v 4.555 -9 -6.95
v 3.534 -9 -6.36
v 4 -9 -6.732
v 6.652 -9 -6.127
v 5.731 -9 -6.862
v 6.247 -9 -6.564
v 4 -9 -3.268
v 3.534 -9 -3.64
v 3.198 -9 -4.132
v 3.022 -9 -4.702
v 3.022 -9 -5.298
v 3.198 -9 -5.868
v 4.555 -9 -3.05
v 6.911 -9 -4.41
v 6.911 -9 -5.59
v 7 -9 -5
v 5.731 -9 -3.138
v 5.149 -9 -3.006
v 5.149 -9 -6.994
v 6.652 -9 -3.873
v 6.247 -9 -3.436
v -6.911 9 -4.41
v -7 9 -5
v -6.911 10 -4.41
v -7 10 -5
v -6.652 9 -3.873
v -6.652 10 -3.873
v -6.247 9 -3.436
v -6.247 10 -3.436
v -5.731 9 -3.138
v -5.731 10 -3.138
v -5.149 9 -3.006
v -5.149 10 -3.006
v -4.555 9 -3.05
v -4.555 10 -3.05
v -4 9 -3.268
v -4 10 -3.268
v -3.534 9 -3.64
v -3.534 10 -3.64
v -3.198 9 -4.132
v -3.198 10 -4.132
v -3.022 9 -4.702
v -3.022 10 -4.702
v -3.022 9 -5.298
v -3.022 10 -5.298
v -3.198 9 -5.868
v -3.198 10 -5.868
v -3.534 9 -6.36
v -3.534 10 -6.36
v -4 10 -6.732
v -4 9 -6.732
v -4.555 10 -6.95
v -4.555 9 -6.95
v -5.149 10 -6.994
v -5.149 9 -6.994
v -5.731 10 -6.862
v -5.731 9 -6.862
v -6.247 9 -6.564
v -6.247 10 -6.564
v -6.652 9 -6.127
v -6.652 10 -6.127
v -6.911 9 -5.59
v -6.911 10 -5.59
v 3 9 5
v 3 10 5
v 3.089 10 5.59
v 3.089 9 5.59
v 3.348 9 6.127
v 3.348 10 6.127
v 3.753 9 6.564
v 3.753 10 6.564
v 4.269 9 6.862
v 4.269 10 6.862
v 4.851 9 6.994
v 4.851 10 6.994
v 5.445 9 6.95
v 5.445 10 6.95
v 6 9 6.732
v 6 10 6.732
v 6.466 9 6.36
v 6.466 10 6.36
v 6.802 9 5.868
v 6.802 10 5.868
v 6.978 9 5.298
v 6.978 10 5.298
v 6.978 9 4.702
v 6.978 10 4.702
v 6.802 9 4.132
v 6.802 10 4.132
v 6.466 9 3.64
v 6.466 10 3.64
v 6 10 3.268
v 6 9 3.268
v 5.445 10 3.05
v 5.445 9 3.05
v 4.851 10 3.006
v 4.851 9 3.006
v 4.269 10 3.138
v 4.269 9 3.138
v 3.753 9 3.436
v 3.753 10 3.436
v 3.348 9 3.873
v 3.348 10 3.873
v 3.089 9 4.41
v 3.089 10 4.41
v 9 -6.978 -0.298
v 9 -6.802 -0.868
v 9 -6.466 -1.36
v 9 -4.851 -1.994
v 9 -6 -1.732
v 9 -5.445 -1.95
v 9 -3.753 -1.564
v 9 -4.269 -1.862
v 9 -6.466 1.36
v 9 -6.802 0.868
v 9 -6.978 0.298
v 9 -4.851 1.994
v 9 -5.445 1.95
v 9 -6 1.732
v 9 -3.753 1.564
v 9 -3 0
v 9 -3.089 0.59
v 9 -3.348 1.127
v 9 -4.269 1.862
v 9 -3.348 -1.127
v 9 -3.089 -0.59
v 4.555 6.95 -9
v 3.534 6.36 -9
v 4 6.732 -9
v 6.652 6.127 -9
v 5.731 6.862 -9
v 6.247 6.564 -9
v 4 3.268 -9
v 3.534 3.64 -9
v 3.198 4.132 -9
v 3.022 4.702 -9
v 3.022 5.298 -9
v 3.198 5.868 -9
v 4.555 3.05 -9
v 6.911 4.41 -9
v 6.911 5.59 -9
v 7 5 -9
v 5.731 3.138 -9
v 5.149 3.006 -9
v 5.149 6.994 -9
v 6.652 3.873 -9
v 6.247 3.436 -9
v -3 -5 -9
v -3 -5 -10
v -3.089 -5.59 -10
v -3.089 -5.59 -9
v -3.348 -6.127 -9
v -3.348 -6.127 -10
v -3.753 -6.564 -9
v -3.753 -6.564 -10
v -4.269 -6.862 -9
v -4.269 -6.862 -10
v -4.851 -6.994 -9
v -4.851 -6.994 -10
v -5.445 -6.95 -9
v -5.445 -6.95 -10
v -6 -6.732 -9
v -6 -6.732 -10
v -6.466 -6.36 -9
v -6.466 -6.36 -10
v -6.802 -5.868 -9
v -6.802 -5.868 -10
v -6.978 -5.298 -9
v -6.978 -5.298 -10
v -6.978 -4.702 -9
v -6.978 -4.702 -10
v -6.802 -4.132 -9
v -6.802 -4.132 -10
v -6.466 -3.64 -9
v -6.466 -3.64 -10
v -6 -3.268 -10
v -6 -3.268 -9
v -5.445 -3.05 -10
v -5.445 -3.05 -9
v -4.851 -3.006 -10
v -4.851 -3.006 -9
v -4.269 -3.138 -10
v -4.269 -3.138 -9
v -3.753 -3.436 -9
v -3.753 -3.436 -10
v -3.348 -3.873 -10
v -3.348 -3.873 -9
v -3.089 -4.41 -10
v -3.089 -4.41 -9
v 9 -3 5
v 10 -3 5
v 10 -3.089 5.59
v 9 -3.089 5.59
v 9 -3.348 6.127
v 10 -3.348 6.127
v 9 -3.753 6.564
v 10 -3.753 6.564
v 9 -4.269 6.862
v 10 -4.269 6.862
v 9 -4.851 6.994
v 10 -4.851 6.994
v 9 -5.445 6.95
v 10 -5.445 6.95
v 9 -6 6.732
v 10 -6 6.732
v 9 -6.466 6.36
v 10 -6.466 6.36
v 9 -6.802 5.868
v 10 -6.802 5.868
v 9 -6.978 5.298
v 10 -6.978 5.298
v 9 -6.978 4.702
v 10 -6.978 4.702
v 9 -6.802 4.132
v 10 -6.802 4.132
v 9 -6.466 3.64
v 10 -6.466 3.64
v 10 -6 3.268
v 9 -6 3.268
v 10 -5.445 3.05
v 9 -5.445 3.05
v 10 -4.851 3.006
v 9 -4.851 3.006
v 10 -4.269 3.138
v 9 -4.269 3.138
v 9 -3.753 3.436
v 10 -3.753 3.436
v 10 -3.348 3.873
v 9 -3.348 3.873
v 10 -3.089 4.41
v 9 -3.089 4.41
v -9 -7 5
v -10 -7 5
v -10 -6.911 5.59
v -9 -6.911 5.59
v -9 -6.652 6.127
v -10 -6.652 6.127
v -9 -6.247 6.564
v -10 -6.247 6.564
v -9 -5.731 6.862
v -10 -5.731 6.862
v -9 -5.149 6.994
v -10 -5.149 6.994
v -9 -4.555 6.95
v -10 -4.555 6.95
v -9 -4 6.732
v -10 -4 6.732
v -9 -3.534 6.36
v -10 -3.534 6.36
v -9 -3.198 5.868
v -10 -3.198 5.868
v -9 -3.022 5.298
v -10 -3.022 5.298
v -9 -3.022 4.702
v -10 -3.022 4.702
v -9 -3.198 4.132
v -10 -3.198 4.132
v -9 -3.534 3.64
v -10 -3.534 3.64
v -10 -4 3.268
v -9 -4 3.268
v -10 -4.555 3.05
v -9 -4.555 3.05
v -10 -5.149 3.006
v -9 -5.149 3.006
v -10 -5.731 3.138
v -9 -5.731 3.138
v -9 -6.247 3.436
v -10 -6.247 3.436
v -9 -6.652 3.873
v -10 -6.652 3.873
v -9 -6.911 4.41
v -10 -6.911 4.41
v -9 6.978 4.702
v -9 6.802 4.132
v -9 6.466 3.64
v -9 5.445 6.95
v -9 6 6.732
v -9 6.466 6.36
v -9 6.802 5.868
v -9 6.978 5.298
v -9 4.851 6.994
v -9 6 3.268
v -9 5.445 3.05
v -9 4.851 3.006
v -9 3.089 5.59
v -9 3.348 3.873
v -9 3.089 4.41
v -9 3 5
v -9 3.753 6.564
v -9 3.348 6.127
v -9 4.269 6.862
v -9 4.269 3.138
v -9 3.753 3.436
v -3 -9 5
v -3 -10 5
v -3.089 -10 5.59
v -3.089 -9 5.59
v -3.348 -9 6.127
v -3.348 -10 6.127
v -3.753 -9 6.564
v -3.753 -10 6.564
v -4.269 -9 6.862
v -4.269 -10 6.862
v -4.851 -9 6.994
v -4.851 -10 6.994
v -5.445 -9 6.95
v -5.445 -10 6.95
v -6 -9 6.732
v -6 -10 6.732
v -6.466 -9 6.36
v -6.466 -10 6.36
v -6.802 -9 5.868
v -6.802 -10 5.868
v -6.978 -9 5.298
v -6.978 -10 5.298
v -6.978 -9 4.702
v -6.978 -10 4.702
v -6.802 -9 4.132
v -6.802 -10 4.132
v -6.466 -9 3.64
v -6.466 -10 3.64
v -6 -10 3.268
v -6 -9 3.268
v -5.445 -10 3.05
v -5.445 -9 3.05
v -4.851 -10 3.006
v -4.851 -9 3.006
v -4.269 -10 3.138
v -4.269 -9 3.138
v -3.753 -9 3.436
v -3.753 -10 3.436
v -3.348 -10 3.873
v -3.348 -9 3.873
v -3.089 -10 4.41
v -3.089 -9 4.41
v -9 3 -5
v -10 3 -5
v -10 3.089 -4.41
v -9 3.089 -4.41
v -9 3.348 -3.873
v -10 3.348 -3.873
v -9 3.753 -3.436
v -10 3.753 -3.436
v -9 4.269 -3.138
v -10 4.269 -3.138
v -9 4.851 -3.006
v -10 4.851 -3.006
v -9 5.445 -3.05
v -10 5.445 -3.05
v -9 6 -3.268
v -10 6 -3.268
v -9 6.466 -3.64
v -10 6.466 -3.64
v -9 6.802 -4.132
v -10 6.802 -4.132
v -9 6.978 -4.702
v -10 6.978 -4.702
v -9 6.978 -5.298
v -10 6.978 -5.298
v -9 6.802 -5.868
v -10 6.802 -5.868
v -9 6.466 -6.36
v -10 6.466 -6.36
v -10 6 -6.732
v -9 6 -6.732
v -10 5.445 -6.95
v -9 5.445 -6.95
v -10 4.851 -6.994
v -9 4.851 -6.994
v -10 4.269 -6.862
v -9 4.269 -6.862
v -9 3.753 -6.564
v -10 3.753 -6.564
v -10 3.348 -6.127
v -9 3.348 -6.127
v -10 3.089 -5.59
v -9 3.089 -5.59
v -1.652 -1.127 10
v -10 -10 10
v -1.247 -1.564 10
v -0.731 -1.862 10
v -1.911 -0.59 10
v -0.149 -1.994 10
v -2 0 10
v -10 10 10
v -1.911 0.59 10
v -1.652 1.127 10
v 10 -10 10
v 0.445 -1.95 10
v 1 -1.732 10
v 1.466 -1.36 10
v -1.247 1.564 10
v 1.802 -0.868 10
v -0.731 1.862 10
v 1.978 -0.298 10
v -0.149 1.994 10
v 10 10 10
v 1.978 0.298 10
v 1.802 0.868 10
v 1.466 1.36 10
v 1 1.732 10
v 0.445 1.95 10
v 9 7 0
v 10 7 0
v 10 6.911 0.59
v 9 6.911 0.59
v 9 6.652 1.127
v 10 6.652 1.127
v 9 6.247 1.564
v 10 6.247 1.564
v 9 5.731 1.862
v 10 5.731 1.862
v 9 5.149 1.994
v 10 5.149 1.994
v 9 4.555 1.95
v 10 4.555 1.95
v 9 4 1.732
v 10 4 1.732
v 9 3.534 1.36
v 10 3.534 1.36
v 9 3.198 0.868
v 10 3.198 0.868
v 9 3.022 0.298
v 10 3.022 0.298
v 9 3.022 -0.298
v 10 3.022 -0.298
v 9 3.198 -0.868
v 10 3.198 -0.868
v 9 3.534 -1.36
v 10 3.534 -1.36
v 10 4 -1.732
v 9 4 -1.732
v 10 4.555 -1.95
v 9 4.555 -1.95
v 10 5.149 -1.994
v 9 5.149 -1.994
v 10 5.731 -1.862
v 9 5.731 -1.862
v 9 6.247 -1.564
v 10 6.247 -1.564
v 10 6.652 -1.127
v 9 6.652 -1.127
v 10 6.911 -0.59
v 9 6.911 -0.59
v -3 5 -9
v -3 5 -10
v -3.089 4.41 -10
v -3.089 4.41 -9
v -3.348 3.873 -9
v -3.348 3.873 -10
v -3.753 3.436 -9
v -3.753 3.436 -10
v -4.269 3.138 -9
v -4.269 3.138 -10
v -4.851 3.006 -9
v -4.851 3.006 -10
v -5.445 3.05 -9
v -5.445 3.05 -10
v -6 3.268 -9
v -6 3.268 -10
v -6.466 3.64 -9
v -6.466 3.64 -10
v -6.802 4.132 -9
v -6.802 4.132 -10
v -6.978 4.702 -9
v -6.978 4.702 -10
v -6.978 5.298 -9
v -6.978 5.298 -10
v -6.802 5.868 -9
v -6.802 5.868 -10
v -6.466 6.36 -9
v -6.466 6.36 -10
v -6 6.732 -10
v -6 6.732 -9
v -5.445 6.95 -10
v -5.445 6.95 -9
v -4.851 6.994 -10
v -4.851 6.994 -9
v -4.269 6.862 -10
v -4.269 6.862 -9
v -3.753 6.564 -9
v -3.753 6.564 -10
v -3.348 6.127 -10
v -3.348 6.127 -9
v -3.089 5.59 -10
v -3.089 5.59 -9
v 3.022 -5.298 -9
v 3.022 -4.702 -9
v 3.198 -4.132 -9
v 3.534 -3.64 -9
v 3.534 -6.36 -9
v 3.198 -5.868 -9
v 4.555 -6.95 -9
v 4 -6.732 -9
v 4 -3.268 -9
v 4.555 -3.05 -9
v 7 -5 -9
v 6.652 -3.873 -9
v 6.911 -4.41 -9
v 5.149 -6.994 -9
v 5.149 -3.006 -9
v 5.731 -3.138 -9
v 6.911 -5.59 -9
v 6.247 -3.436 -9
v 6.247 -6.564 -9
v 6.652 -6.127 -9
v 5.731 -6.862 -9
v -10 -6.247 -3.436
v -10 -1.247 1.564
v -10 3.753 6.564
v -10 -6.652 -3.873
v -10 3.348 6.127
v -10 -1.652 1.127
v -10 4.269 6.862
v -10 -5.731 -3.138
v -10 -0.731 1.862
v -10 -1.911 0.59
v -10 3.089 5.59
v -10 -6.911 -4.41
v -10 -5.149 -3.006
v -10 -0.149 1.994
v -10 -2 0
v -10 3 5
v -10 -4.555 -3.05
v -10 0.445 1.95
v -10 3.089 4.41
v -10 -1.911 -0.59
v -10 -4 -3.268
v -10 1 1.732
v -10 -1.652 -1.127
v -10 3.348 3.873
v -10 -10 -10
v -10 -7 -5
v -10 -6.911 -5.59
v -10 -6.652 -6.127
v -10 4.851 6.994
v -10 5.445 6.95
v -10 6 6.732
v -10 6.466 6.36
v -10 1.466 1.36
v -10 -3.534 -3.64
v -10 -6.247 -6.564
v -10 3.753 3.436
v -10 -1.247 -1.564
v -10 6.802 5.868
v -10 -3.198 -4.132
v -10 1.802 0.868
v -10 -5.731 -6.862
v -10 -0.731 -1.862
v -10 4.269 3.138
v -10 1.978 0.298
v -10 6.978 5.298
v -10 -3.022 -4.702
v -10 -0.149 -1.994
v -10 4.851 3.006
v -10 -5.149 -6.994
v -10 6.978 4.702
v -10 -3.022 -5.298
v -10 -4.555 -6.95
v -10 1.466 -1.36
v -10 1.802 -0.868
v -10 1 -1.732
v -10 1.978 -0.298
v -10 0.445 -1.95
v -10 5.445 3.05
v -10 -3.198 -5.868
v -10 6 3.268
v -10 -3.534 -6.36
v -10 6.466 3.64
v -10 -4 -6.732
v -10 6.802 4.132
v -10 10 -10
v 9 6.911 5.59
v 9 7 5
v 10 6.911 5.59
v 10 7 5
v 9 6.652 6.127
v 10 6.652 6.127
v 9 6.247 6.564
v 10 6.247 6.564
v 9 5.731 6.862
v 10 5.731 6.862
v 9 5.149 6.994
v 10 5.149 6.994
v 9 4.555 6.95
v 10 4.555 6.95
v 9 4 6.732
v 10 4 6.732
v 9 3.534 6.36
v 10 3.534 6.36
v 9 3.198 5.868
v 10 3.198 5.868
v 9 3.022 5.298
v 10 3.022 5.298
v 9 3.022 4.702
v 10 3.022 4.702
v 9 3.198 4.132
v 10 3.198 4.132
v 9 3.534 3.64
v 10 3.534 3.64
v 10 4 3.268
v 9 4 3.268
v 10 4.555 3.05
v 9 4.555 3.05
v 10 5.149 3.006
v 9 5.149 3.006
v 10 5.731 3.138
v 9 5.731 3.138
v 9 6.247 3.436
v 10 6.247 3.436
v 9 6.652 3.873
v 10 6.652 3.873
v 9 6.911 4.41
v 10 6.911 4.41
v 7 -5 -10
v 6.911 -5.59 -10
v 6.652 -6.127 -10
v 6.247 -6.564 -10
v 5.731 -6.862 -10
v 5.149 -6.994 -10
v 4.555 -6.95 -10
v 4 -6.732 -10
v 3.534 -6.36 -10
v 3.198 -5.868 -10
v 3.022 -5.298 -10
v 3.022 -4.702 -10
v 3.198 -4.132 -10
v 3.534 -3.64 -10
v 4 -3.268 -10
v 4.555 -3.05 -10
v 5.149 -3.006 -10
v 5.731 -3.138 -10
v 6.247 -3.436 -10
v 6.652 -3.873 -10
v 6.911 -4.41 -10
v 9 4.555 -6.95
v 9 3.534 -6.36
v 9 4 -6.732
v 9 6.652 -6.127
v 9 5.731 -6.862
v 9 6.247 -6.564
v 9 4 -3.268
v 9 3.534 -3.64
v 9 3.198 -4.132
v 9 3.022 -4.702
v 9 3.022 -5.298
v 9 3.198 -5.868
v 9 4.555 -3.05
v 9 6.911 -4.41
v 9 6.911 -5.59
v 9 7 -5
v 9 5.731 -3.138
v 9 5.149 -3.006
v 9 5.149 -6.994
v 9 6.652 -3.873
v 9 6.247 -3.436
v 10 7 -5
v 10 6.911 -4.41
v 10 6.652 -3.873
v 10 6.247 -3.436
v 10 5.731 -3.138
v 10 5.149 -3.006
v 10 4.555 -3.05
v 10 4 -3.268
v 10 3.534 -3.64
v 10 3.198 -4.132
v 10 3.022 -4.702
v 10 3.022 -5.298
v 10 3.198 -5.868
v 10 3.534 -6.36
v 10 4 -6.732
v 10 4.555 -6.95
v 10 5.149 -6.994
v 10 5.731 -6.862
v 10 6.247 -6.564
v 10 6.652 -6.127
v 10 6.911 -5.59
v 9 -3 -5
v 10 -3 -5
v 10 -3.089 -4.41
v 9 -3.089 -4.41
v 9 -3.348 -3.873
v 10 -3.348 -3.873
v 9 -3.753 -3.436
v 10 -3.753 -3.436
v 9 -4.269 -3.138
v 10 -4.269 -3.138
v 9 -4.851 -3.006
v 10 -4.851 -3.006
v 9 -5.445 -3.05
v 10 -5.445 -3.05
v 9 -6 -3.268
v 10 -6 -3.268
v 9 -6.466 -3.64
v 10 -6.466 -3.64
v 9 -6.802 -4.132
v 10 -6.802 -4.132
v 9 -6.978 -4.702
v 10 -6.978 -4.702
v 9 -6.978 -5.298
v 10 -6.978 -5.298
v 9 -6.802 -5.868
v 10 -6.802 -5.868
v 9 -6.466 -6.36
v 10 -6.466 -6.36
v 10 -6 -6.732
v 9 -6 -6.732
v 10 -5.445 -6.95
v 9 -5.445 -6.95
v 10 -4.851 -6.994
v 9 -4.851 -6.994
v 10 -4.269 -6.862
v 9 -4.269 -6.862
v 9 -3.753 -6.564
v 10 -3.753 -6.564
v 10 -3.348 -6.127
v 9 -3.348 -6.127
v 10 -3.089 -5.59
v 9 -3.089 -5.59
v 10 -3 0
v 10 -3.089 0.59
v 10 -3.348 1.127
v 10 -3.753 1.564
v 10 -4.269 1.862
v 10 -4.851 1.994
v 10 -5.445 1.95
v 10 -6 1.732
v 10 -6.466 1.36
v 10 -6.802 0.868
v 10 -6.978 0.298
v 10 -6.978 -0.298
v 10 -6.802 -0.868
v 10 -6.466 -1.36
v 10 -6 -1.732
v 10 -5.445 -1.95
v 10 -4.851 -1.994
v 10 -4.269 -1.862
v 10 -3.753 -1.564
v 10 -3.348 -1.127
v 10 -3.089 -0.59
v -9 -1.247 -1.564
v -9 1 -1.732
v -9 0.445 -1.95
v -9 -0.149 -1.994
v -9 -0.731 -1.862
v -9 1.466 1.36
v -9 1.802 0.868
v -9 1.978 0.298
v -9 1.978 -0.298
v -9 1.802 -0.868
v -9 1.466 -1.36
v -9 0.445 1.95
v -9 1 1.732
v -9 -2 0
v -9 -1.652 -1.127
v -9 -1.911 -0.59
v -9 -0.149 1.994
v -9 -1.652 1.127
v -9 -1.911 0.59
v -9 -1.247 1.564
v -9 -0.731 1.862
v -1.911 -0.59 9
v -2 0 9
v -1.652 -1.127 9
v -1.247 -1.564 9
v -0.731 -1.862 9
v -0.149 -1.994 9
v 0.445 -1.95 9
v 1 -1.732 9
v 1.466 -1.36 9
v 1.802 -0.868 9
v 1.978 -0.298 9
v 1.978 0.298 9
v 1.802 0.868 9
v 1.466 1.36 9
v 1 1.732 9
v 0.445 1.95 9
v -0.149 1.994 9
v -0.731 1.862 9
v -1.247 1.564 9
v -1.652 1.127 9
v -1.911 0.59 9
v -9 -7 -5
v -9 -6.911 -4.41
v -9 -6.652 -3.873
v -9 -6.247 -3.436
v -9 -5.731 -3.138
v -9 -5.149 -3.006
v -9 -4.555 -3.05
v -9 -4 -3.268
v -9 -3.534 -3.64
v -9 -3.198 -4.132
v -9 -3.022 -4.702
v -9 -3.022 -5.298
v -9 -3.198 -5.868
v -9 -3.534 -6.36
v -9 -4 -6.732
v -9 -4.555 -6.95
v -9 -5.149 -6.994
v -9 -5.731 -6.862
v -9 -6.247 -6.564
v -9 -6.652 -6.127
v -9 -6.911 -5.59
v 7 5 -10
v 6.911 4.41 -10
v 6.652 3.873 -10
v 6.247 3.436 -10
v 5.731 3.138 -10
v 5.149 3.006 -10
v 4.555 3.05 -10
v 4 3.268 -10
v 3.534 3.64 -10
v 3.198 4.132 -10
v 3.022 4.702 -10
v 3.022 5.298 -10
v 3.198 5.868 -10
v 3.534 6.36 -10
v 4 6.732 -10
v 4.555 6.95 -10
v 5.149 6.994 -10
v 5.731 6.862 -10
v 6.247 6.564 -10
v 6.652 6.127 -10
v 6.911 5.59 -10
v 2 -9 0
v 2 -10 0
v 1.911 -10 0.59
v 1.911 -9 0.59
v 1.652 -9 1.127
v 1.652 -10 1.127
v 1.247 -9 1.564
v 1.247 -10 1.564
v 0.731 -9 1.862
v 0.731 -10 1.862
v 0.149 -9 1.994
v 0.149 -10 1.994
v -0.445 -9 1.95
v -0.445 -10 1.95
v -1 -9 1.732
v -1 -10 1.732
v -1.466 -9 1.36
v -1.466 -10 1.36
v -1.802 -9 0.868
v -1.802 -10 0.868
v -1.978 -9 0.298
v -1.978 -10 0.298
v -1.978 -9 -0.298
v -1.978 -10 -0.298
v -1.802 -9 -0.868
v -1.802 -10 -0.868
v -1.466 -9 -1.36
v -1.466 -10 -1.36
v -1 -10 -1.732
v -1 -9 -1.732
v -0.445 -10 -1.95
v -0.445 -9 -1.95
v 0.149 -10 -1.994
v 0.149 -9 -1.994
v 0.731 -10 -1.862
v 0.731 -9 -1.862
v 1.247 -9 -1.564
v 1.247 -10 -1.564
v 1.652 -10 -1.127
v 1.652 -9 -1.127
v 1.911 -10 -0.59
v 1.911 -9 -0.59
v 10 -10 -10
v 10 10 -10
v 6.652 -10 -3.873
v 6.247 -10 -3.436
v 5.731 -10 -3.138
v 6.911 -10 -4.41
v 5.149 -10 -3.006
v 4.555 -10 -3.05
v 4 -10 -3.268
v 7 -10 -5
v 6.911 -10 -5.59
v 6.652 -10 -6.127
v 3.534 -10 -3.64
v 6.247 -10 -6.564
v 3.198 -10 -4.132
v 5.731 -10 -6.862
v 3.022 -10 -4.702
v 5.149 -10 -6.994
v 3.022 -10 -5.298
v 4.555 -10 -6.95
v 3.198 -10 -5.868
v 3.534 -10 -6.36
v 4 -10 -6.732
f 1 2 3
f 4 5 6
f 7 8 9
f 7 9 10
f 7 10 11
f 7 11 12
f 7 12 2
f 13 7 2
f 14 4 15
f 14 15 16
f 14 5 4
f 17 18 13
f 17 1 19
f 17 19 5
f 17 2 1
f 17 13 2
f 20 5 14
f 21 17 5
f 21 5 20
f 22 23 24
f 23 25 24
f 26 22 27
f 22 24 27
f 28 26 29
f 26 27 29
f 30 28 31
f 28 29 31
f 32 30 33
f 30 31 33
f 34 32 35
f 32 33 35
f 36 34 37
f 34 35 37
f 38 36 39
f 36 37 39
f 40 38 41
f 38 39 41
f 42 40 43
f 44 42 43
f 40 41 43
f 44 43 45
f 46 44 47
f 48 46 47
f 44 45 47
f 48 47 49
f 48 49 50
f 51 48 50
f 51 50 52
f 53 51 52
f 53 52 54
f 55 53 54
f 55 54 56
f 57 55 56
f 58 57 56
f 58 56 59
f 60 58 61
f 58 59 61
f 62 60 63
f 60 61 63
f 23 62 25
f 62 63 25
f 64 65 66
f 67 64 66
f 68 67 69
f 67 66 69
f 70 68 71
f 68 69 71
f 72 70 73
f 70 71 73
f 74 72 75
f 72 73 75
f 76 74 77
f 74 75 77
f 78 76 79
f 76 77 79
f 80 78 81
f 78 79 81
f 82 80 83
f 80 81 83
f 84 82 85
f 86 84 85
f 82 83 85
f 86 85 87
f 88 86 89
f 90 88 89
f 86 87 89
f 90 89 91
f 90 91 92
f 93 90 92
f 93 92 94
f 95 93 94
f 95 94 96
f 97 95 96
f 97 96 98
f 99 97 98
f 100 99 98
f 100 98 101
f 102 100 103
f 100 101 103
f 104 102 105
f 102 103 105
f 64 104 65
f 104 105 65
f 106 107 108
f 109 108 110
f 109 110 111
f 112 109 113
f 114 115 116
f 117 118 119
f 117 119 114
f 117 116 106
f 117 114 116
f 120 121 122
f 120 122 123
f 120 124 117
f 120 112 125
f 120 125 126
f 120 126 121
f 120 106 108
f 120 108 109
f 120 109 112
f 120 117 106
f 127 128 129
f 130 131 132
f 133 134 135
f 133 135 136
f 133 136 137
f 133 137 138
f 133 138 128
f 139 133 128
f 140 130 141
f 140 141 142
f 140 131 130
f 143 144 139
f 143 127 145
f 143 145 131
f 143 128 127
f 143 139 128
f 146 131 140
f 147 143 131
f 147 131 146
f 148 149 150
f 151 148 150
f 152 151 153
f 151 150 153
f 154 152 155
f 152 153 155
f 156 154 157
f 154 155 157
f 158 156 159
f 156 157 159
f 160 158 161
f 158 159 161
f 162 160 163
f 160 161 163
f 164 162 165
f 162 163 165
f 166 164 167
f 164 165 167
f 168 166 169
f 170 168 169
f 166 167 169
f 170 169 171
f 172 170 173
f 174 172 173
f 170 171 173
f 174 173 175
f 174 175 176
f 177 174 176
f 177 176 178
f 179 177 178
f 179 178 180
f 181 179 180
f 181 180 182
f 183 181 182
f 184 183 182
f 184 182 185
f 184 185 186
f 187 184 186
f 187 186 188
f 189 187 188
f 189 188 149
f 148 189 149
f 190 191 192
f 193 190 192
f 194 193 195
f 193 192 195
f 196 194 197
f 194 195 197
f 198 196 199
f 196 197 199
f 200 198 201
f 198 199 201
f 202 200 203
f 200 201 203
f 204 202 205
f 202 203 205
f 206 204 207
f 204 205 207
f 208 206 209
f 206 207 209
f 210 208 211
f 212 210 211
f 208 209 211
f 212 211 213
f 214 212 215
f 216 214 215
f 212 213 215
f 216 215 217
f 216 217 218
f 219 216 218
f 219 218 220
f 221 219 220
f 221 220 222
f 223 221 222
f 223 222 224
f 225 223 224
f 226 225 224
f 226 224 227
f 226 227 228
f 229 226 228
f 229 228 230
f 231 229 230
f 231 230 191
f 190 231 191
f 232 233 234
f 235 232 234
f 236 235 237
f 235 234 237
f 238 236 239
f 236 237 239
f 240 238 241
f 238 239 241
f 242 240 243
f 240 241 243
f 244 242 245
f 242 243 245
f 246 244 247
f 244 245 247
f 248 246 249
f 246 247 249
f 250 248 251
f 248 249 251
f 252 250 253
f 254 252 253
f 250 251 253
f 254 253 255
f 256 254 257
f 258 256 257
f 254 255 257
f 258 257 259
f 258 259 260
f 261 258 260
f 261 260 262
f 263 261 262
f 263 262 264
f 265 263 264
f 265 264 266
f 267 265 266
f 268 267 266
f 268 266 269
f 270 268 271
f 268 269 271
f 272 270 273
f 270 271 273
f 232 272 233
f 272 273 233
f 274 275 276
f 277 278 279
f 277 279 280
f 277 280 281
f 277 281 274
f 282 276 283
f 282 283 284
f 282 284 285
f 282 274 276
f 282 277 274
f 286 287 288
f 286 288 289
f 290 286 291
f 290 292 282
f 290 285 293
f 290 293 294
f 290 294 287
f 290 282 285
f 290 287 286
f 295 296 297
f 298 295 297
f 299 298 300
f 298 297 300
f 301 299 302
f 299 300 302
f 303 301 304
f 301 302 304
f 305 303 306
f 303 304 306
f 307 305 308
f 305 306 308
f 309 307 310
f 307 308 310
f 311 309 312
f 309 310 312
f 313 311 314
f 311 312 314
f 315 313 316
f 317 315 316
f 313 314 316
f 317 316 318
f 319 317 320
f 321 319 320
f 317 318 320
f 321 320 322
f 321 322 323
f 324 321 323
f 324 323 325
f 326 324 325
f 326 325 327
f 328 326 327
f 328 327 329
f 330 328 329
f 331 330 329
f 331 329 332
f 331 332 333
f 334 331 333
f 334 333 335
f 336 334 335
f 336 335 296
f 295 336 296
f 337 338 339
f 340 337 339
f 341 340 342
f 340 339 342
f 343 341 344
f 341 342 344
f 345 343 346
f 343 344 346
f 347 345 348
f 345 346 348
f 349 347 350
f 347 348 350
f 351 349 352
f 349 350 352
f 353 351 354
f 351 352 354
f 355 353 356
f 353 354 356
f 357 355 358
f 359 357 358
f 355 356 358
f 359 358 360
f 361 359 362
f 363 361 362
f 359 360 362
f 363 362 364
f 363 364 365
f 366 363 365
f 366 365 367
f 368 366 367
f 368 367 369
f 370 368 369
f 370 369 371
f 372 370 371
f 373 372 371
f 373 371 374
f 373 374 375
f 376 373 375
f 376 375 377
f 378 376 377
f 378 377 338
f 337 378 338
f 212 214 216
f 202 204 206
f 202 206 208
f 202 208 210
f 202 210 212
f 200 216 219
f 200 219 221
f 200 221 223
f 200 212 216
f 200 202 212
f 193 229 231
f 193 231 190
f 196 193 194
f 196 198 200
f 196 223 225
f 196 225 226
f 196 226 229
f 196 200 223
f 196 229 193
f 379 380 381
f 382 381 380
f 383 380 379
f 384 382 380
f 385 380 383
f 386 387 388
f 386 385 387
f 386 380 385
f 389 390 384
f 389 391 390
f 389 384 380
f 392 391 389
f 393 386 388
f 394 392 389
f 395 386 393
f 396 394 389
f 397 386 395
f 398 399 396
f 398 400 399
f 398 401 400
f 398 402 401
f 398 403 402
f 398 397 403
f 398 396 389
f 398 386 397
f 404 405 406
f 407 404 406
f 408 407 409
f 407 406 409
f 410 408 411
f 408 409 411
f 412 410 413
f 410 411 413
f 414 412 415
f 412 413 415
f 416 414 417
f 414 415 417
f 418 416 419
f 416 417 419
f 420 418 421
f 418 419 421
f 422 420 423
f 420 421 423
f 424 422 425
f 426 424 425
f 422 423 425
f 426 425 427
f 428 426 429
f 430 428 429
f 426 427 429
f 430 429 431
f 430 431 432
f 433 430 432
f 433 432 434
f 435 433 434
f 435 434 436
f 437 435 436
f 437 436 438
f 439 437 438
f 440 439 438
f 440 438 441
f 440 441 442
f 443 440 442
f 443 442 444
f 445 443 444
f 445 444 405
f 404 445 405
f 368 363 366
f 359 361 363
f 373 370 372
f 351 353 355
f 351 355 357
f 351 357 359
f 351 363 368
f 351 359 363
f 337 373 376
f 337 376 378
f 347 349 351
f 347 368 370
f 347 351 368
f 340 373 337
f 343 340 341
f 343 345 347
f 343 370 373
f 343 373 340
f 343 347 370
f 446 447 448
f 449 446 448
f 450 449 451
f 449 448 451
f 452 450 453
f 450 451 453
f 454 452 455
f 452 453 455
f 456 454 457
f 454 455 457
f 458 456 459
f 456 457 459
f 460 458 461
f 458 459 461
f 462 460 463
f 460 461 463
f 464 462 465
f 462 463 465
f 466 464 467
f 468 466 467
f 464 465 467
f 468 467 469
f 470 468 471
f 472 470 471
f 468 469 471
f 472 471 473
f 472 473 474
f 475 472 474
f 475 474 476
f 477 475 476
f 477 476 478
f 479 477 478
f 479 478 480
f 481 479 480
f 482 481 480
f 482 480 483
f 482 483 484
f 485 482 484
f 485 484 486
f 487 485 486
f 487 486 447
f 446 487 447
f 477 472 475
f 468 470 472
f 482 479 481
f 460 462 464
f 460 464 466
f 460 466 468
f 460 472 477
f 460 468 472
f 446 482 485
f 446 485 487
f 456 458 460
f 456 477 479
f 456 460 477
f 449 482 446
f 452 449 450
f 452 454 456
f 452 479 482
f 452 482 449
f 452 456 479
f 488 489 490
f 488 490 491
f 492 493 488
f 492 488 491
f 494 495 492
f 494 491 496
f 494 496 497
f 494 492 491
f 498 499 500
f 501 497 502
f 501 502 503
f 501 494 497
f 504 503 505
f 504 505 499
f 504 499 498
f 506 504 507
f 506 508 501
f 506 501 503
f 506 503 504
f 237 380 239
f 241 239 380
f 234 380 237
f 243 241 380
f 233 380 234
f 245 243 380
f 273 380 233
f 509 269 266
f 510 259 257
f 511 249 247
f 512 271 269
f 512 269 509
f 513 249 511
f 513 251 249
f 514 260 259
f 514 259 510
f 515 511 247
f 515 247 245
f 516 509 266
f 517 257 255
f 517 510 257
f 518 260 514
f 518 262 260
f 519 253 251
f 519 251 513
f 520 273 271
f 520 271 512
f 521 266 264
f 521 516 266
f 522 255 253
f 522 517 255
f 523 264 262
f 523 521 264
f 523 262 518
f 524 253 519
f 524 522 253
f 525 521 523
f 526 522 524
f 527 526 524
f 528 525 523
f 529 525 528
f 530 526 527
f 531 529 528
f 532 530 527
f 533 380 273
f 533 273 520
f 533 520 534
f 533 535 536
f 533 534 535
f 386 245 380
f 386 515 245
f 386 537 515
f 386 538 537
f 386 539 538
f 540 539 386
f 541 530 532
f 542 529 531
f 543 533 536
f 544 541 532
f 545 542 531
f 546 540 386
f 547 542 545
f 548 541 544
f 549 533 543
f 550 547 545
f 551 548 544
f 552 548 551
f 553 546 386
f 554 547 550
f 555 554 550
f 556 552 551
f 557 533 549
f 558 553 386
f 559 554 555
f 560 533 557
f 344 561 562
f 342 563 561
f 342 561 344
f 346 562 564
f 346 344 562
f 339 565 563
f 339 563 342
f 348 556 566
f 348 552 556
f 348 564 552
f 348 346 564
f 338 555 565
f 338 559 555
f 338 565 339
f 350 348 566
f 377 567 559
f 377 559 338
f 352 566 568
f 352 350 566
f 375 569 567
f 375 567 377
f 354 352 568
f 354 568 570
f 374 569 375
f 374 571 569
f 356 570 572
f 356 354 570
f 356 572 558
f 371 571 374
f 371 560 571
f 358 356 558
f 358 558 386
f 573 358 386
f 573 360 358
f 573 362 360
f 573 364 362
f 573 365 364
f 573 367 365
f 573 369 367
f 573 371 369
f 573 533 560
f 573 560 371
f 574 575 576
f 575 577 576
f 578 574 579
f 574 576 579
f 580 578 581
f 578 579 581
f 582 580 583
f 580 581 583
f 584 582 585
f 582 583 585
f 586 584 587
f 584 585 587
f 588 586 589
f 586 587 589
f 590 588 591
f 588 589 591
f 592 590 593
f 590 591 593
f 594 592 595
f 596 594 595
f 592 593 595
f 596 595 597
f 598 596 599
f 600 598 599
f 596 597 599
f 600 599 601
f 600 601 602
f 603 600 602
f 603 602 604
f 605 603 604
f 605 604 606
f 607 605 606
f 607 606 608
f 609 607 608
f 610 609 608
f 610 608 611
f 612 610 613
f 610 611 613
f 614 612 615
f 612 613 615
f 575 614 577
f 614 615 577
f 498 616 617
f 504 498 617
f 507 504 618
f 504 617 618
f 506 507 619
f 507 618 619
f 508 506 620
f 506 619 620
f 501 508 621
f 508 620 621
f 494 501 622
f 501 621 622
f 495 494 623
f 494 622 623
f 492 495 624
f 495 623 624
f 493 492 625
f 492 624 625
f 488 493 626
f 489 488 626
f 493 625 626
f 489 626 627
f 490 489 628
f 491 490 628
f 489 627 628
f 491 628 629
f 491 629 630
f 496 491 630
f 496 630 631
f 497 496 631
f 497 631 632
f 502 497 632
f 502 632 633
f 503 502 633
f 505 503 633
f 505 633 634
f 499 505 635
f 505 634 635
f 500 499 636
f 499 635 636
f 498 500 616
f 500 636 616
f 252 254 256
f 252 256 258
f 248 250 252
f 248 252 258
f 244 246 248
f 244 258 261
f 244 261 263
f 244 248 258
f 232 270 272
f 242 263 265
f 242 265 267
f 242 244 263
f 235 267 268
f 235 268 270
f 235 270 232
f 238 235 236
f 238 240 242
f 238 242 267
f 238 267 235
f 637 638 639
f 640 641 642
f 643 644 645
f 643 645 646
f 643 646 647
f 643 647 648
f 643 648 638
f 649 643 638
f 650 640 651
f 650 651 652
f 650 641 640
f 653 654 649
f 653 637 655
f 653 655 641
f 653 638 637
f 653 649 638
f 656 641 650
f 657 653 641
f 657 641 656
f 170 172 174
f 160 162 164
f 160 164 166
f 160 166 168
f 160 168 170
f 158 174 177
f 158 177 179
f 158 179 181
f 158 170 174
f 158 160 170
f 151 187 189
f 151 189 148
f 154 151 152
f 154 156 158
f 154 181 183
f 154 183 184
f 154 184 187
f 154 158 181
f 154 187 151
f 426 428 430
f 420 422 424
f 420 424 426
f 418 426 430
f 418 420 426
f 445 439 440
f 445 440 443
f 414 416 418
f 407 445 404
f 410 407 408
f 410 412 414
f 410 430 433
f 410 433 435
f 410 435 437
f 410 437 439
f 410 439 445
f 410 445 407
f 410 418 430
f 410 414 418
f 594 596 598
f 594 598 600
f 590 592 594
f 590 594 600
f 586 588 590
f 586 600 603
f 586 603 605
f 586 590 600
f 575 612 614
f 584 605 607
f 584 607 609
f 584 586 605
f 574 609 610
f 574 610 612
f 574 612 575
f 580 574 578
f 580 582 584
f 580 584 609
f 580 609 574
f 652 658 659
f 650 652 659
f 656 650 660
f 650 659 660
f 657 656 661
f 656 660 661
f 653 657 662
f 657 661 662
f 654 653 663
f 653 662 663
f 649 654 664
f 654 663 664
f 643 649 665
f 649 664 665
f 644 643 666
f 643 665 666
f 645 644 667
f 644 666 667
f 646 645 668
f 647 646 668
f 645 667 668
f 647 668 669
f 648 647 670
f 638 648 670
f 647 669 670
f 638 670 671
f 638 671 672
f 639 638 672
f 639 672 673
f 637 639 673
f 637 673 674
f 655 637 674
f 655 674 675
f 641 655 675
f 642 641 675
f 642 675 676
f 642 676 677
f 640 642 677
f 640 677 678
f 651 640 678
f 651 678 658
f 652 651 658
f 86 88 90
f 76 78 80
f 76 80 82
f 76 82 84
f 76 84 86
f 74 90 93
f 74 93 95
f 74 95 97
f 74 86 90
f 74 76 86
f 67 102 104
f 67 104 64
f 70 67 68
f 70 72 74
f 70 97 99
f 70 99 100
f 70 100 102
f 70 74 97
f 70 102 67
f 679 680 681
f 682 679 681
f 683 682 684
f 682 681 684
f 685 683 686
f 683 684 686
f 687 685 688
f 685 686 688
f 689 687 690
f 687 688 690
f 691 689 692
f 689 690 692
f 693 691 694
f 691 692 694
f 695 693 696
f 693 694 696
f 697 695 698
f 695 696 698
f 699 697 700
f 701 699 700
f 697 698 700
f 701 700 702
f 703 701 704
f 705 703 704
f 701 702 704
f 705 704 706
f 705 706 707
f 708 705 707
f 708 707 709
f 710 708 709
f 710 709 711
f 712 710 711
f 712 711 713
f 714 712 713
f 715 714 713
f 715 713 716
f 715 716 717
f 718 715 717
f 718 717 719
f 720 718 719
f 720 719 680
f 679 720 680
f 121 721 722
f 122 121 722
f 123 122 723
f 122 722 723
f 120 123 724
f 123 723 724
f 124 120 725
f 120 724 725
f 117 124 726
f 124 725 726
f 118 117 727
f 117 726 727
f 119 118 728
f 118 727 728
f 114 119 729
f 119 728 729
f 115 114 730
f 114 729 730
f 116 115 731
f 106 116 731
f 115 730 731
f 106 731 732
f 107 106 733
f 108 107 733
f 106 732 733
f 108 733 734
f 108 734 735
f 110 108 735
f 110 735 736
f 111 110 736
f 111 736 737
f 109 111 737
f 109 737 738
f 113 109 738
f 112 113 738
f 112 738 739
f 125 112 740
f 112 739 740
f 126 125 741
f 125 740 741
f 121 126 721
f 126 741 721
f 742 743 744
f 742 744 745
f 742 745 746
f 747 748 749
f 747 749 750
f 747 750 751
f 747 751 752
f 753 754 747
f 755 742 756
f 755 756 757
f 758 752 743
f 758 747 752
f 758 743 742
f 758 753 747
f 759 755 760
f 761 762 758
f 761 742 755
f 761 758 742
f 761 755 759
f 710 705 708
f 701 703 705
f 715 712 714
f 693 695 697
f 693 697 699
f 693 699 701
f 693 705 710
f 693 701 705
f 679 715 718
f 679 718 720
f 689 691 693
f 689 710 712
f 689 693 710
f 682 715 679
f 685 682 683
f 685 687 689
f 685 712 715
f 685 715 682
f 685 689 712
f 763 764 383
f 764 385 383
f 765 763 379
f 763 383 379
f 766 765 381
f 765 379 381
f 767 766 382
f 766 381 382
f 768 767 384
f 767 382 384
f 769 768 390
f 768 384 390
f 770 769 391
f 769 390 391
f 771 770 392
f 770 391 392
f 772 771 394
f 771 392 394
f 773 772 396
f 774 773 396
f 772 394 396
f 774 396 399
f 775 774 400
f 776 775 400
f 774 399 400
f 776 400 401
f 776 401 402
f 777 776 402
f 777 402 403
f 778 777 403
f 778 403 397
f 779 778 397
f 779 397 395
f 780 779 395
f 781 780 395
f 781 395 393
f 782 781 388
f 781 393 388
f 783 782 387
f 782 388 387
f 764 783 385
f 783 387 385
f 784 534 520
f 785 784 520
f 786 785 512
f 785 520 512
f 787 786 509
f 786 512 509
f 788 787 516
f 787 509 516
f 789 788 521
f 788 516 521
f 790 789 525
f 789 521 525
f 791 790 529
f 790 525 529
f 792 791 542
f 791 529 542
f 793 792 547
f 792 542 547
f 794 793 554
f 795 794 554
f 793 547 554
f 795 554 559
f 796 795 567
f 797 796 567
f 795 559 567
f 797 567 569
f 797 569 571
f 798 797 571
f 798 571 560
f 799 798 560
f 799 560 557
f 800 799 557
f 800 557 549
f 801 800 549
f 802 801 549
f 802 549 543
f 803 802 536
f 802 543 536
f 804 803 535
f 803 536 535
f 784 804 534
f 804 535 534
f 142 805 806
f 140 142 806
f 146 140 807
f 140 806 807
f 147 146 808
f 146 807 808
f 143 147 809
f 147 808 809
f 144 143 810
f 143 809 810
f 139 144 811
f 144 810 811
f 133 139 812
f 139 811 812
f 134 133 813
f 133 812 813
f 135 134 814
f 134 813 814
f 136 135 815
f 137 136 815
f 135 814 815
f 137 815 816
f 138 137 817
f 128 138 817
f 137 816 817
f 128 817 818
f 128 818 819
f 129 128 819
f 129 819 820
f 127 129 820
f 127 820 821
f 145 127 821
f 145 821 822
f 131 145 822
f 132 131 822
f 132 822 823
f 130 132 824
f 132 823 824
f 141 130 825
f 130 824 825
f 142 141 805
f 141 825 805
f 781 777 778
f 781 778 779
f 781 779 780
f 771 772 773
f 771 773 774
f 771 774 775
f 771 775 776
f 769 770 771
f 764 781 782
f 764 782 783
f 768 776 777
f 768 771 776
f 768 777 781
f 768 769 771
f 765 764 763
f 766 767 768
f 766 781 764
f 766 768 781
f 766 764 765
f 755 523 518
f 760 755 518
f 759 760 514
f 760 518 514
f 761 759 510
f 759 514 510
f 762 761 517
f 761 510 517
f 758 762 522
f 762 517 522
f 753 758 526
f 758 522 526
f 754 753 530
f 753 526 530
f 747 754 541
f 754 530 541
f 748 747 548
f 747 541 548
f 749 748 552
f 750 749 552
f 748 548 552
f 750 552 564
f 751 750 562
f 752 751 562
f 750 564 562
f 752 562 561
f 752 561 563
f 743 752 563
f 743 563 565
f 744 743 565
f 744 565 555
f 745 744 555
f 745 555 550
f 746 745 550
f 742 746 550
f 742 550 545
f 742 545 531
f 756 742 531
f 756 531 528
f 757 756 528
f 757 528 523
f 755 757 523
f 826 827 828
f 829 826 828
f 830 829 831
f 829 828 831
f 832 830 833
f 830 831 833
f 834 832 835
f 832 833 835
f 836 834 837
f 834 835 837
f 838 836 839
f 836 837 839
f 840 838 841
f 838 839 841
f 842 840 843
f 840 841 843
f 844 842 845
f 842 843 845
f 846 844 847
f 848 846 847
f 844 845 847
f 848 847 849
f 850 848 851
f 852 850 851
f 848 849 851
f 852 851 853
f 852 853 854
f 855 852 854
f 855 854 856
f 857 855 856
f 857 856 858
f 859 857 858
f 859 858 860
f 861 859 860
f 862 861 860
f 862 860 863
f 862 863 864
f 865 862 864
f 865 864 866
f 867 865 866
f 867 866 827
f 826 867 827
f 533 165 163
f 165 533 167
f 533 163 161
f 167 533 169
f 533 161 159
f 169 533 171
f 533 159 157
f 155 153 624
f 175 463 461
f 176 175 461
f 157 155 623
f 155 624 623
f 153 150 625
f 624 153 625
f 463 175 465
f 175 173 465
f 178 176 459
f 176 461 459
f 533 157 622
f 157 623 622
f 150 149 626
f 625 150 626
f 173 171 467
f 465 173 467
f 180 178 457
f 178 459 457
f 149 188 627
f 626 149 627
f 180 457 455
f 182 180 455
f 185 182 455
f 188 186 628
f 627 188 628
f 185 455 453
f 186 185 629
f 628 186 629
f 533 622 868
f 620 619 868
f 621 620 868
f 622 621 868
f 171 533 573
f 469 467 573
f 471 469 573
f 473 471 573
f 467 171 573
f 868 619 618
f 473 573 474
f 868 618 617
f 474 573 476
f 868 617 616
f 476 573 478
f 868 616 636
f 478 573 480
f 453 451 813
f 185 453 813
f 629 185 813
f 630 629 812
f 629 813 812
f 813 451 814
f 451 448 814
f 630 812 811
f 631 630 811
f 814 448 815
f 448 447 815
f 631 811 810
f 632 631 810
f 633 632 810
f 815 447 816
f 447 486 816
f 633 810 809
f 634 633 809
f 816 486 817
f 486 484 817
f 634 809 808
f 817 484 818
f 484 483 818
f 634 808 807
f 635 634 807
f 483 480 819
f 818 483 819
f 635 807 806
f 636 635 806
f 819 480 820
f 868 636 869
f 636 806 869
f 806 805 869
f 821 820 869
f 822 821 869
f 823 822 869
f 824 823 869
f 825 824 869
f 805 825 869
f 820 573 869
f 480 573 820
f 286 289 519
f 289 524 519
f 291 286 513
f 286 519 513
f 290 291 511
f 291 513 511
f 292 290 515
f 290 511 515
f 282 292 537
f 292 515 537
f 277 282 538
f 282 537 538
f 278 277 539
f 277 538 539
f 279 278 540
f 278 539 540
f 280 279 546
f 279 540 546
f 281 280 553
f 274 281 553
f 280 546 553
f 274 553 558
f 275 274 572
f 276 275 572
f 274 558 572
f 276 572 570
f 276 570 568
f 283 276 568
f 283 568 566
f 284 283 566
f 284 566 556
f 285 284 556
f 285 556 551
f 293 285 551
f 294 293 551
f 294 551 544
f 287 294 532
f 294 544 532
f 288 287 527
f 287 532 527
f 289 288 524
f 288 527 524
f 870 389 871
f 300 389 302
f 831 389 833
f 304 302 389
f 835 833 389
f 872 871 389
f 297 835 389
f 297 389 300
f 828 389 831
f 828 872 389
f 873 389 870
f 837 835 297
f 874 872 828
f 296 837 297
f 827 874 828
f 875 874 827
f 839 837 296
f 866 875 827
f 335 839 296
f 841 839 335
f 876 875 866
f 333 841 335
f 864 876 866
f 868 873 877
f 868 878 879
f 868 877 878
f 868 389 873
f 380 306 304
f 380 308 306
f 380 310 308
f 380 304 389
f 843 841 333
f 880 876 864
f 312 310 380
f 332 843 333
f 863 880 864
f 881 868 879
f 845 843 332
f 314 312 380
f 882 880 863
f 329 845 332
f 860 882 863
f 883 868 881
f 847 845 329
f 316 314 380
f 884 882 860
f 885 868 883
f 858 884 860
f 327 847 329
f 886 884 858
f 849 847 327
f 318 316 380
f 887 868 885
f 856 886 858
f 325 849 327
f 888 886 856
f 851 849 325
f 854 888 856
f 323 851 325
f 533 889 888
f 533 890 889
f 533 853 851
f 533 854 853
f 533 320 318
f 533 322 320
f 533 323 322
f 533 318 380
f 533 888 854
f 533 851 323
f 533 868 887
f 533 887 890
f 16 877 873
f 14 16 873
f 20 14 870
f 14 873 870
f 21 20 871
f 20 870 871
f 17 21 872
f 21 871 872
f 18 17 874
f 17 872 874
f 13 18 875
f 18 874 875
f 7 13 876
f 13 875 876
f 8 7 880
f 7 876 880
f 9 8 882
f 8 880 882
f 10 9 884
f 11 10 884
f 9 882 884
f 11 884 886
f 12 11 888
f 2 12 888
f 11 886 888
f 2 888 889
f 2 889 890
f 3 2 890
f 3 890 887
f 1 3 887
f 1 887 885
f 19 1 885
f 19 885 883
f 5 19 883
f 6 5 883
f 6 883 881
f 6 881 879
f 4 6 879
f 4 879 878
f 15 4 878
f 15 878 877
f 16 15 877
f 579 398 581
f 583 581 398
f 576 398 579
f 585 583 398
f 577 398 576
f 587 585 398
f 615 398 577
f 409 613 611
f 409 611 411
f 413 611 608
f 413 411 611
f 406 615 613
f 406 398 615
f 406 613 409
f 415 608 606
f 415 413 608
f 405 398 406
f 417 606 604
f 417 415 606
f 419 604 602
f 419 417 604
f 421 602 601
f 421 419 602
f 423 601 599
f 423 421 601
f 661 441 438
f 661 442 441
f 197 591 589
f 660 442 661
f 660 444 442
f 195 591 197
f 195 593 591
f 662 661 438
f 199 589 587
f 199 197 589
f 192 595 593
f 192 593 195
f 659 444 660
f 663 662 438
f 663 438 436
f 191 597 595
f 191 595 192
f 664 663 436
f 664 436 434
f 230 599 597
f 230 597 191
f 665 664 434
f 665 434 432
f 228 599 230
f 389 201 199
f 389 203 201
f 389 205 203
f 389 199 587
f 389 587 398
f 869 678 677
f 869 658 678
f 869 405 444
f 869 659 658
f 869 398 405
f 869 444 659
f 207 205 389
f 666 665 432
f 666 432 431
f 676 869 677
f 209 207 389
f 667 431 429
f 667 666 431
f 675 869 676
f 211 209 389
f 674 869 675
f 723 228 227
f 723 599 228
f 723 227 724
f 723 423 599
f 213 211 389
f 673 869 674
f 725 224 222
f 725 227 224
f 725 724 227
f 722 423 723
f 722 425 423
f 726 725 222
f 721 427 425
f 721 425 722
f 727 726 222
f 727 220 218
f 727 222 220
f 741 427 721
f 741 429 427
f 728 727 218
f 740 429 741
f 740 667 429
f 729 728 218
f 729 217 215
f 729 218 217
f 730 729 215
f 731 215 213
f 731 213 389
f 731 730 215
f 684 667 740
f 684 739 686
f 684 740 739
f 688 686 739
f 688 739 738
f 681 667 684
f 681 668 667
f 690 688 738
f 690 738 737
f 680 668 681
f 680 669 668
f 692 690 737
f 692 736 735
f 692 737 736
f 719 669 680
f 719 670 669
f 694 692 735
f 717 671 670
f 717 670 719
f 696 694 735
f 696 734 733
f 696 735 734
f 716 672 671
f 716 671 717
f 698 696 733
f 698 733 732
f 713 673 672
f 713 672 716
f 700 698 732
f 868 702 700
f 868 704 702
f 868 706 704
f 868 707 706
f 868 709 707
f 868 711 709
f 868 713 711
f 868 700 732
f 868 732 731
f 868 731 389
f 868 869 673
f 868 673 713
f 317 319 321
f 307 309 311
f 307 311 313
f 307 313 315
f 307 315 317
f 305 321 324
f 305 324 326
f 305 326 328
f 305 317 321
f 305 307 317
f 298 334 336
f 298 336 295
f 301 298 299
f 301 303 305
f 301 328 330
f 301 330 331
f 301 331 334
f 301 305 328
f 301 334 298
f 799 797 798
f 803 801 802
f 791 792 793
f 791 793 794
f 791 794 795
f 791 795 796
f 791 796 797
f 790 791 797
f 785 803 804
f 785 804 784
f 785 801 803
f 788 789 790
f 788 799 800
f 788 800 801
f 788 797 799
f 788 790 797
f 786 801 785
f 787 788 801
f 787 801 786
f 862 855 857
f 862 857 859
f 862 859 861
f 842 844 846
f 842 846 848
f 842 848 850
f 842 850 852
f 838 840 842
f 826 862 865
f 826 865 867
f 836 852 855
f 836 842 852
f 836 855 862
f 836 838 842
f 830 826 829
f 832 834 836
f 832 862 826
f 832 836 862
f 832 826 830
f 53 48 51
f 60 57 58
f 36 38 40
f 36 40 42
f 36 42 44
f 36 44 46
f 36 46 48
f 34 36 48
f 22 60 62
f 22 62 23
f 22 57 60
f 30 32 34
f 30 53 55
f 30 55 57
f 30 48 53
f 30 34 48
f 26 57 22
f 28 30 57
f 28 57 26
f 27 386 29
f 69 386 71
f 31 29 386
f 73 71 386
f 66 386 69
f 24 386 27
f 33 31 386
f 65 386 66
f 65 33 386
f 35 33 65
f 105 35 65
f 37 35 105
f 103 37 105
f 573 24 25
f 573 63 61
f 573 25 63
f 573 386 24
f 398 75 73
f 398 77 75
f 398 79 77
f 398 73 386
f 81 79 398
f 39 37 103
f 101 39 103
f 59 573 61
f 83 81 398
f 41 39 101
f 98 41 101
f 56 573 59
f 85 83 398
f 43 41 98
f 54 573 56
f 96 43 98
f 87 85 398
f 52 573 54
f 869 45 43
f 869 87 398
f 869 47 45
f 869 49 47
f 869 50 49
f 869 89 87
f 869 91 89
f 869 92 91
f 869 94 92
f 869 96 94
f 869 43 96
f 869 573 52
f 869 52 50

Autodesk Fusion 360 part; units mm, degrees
sketch "Sketch1" plane through (0, 0, 0) normal (0, 0, 1) x (1, 0, 0)
  line L0 (10, -10) -> (-10, -10)
  line L1 (-10, -10) -> (-10, 10)
  line L2 (-10, 10) -> (10, 10)
  line L3 (10, 10) -> (10, -10)
  line L4 (10, -10) -> (-10, 10) construction
  line L5 (-10, -10) -> (10, 10) construction
  dimension "d1" = 20
  dimension "d2" = 20
extrude "Extrude1" add sketch "Sketch1" along normal mid plane 20
sketch "Sketch2" plane through (0, 0, 10) normal (0, 0, 1) x (-1, 0, 0)
  line L0 (-10, -10) -> (10, -10)
  line L1 (10, -10) -> (10, 10)
  line L2 (10, 10) -> (-10, 10)
  line L3 (-10, 10) -> (-10, -10)
  circle A0 centre (0, 0) radius 2
  dimension "d5" = 4
extrude "Extrude2" cut sketch "Sketch2" against normal blind 1 contours A0
sketch "Sketch3" plane through (0, -10, 0) normal (0, -1, 0) x (1, 0, 0)
  line L0 (10, -10) -> (10, 10)
  line L1 (10, 10) -> (-10, 10)
  line L2 (-10, 10) -> (-10, -10)
  line L3 (-10, -10) -> (10, -10)
  line L4 (-10, 10) -> (10, -10) construction
  circle A0 centre (0, 0) radius 2
  circle A1 centre (-5, 5) radius 2
  circle A2 centre (5, -5) radius 2
  dimension "d8" = 4
  dimension "d9" = 4
  dimension "d10" = 4
extrude "Extrude3" cut sketch "Sketch3" against normal blind 1 contours A0 | A1 | A2
sketch "Sketch4" plane through (-10, 0, 0) normal (-1, 0, 0) x (0, -1, 0)
  line L0 (10, -10) -> (10, 10)
  line L1 (10, 10) -> (-10, 10)
  line L2 (-10, 10) -> (-10, -10)
  line L3 (-10, -10) -> (10, -10)
  line L4 (-10, 10) -> (10, -10) construction
  line L5 (10, 10) -> (-10, -10) construction
  circle A0 centre (0, 0) radius 2
  circle A1 centre (-5, 5) radius 2
  circle A2 centre (5, 5) radius 2
  circle A3 centre (-5, -5) radius 2
  circle A4 centre (5, -5) radius 2
  dimension "d13" = 4
  dimension "d14" = 4
  dimension "d15" = 4
  dimension "d16" = 4
extrude "Extrude4" cut sketch "Sketch4" against normal blind 1 contours A0 | A1 | A2 | A3 | A4
sketch "Sketch5" plane through (0, 10, 0) normal (0, 1, 0) x (-1, 0, 0)
  line L0 (10, -10) -> (10, 10)
  line L1 (10, 10) -> (-10, 10)
  line L2 (-10, 10) -> (-10, -10)
  line L3 (-10, -10) -> (10, -10)
  line L4 (-10, 10) -> (10, -10) construction
  circle A0 centre (-5, 5) radius 2
  circle A1 centre (5, -5) radius 2
  dimension "d19" = 4
  dimension "d20" = 4
extrude "Extrude5" cut sketch "Sketch5" against normal blind 1 contours A0 | A1
sketch "Sketch6" plane through (10, 0, 0) normal (1, 0, 0) x (0, 1, 0)
  line L0 (10, -10) -> (10, 10)
  line L1 (10, 10) -> (-10, 10)
  line L2 (-10, 10) -> (-10, -10)
  line L3 (-10, -10) -> (10, -10)
  line L4 (-10, 10) -> (10, -10) construction
  line L5 (10, 10) -> (-10, -10) construction
  line L6 (-10, 0) -> (10, 0) construction
  line L7 (0, 10) -> (0, -10) construction
  circle A0 centre (-5, 0) radius 2
  circle A1 centre (-5, 5) radius 2
  circle A2 centre (-5, -5) radius 2
  circle A3 centre (5, 5) radius 2
  circle A4 centre (5, 0) radius 2
  circle A5 centre (5, -5) radius 2
  dimension "d23" = 4
  dimension "d24" = 4
  dimension "d25" = 4
  dimension "d26" = 4
  dimension "d27" = 4
  dimension "d28" = 4
extrude "Extrude6" cut sketch "Sketch6" against normal blind 1 contours A0 | A1 | A2 | A3 | A4 | A5
sketch "Sketch7" plane through (0, 0, -10) normal (0, 0, -1) x (1, 0, 0)
  line L0 (-10, -10) -> (10, -10)
  line L1 (10, -10) -> (10, 10)
  line L2 (10, 10) -> (-10, 10)
  line L3 (-10, 10) -> (-10, -10)
  line L4 (10, 10) -> (-10, -10) construction
  line L5 (10, -10) -> (-10, 10) construction
  circle A0 centre (5, 5) radius 2
  circle A1 centre (-5, -5) radius 2
  circle A2 centre (-5, 5) radius 2
  circle A3 centre (5, -5) radius 2
  dimension "d31" = 4
  dimension "d32" = 4
  dimension "d33" = 4
extrude "Extrude7" cut sketch "Sketch7" against normal blind 1 contours A0 | A1 | A2 | A3
equation "d1 = diceSize"
equation "d2 = diceSize"
equation "d3 = diceSize"
equation "diceSize = 20 mm"
equation "DivotDia = 4 mm"
